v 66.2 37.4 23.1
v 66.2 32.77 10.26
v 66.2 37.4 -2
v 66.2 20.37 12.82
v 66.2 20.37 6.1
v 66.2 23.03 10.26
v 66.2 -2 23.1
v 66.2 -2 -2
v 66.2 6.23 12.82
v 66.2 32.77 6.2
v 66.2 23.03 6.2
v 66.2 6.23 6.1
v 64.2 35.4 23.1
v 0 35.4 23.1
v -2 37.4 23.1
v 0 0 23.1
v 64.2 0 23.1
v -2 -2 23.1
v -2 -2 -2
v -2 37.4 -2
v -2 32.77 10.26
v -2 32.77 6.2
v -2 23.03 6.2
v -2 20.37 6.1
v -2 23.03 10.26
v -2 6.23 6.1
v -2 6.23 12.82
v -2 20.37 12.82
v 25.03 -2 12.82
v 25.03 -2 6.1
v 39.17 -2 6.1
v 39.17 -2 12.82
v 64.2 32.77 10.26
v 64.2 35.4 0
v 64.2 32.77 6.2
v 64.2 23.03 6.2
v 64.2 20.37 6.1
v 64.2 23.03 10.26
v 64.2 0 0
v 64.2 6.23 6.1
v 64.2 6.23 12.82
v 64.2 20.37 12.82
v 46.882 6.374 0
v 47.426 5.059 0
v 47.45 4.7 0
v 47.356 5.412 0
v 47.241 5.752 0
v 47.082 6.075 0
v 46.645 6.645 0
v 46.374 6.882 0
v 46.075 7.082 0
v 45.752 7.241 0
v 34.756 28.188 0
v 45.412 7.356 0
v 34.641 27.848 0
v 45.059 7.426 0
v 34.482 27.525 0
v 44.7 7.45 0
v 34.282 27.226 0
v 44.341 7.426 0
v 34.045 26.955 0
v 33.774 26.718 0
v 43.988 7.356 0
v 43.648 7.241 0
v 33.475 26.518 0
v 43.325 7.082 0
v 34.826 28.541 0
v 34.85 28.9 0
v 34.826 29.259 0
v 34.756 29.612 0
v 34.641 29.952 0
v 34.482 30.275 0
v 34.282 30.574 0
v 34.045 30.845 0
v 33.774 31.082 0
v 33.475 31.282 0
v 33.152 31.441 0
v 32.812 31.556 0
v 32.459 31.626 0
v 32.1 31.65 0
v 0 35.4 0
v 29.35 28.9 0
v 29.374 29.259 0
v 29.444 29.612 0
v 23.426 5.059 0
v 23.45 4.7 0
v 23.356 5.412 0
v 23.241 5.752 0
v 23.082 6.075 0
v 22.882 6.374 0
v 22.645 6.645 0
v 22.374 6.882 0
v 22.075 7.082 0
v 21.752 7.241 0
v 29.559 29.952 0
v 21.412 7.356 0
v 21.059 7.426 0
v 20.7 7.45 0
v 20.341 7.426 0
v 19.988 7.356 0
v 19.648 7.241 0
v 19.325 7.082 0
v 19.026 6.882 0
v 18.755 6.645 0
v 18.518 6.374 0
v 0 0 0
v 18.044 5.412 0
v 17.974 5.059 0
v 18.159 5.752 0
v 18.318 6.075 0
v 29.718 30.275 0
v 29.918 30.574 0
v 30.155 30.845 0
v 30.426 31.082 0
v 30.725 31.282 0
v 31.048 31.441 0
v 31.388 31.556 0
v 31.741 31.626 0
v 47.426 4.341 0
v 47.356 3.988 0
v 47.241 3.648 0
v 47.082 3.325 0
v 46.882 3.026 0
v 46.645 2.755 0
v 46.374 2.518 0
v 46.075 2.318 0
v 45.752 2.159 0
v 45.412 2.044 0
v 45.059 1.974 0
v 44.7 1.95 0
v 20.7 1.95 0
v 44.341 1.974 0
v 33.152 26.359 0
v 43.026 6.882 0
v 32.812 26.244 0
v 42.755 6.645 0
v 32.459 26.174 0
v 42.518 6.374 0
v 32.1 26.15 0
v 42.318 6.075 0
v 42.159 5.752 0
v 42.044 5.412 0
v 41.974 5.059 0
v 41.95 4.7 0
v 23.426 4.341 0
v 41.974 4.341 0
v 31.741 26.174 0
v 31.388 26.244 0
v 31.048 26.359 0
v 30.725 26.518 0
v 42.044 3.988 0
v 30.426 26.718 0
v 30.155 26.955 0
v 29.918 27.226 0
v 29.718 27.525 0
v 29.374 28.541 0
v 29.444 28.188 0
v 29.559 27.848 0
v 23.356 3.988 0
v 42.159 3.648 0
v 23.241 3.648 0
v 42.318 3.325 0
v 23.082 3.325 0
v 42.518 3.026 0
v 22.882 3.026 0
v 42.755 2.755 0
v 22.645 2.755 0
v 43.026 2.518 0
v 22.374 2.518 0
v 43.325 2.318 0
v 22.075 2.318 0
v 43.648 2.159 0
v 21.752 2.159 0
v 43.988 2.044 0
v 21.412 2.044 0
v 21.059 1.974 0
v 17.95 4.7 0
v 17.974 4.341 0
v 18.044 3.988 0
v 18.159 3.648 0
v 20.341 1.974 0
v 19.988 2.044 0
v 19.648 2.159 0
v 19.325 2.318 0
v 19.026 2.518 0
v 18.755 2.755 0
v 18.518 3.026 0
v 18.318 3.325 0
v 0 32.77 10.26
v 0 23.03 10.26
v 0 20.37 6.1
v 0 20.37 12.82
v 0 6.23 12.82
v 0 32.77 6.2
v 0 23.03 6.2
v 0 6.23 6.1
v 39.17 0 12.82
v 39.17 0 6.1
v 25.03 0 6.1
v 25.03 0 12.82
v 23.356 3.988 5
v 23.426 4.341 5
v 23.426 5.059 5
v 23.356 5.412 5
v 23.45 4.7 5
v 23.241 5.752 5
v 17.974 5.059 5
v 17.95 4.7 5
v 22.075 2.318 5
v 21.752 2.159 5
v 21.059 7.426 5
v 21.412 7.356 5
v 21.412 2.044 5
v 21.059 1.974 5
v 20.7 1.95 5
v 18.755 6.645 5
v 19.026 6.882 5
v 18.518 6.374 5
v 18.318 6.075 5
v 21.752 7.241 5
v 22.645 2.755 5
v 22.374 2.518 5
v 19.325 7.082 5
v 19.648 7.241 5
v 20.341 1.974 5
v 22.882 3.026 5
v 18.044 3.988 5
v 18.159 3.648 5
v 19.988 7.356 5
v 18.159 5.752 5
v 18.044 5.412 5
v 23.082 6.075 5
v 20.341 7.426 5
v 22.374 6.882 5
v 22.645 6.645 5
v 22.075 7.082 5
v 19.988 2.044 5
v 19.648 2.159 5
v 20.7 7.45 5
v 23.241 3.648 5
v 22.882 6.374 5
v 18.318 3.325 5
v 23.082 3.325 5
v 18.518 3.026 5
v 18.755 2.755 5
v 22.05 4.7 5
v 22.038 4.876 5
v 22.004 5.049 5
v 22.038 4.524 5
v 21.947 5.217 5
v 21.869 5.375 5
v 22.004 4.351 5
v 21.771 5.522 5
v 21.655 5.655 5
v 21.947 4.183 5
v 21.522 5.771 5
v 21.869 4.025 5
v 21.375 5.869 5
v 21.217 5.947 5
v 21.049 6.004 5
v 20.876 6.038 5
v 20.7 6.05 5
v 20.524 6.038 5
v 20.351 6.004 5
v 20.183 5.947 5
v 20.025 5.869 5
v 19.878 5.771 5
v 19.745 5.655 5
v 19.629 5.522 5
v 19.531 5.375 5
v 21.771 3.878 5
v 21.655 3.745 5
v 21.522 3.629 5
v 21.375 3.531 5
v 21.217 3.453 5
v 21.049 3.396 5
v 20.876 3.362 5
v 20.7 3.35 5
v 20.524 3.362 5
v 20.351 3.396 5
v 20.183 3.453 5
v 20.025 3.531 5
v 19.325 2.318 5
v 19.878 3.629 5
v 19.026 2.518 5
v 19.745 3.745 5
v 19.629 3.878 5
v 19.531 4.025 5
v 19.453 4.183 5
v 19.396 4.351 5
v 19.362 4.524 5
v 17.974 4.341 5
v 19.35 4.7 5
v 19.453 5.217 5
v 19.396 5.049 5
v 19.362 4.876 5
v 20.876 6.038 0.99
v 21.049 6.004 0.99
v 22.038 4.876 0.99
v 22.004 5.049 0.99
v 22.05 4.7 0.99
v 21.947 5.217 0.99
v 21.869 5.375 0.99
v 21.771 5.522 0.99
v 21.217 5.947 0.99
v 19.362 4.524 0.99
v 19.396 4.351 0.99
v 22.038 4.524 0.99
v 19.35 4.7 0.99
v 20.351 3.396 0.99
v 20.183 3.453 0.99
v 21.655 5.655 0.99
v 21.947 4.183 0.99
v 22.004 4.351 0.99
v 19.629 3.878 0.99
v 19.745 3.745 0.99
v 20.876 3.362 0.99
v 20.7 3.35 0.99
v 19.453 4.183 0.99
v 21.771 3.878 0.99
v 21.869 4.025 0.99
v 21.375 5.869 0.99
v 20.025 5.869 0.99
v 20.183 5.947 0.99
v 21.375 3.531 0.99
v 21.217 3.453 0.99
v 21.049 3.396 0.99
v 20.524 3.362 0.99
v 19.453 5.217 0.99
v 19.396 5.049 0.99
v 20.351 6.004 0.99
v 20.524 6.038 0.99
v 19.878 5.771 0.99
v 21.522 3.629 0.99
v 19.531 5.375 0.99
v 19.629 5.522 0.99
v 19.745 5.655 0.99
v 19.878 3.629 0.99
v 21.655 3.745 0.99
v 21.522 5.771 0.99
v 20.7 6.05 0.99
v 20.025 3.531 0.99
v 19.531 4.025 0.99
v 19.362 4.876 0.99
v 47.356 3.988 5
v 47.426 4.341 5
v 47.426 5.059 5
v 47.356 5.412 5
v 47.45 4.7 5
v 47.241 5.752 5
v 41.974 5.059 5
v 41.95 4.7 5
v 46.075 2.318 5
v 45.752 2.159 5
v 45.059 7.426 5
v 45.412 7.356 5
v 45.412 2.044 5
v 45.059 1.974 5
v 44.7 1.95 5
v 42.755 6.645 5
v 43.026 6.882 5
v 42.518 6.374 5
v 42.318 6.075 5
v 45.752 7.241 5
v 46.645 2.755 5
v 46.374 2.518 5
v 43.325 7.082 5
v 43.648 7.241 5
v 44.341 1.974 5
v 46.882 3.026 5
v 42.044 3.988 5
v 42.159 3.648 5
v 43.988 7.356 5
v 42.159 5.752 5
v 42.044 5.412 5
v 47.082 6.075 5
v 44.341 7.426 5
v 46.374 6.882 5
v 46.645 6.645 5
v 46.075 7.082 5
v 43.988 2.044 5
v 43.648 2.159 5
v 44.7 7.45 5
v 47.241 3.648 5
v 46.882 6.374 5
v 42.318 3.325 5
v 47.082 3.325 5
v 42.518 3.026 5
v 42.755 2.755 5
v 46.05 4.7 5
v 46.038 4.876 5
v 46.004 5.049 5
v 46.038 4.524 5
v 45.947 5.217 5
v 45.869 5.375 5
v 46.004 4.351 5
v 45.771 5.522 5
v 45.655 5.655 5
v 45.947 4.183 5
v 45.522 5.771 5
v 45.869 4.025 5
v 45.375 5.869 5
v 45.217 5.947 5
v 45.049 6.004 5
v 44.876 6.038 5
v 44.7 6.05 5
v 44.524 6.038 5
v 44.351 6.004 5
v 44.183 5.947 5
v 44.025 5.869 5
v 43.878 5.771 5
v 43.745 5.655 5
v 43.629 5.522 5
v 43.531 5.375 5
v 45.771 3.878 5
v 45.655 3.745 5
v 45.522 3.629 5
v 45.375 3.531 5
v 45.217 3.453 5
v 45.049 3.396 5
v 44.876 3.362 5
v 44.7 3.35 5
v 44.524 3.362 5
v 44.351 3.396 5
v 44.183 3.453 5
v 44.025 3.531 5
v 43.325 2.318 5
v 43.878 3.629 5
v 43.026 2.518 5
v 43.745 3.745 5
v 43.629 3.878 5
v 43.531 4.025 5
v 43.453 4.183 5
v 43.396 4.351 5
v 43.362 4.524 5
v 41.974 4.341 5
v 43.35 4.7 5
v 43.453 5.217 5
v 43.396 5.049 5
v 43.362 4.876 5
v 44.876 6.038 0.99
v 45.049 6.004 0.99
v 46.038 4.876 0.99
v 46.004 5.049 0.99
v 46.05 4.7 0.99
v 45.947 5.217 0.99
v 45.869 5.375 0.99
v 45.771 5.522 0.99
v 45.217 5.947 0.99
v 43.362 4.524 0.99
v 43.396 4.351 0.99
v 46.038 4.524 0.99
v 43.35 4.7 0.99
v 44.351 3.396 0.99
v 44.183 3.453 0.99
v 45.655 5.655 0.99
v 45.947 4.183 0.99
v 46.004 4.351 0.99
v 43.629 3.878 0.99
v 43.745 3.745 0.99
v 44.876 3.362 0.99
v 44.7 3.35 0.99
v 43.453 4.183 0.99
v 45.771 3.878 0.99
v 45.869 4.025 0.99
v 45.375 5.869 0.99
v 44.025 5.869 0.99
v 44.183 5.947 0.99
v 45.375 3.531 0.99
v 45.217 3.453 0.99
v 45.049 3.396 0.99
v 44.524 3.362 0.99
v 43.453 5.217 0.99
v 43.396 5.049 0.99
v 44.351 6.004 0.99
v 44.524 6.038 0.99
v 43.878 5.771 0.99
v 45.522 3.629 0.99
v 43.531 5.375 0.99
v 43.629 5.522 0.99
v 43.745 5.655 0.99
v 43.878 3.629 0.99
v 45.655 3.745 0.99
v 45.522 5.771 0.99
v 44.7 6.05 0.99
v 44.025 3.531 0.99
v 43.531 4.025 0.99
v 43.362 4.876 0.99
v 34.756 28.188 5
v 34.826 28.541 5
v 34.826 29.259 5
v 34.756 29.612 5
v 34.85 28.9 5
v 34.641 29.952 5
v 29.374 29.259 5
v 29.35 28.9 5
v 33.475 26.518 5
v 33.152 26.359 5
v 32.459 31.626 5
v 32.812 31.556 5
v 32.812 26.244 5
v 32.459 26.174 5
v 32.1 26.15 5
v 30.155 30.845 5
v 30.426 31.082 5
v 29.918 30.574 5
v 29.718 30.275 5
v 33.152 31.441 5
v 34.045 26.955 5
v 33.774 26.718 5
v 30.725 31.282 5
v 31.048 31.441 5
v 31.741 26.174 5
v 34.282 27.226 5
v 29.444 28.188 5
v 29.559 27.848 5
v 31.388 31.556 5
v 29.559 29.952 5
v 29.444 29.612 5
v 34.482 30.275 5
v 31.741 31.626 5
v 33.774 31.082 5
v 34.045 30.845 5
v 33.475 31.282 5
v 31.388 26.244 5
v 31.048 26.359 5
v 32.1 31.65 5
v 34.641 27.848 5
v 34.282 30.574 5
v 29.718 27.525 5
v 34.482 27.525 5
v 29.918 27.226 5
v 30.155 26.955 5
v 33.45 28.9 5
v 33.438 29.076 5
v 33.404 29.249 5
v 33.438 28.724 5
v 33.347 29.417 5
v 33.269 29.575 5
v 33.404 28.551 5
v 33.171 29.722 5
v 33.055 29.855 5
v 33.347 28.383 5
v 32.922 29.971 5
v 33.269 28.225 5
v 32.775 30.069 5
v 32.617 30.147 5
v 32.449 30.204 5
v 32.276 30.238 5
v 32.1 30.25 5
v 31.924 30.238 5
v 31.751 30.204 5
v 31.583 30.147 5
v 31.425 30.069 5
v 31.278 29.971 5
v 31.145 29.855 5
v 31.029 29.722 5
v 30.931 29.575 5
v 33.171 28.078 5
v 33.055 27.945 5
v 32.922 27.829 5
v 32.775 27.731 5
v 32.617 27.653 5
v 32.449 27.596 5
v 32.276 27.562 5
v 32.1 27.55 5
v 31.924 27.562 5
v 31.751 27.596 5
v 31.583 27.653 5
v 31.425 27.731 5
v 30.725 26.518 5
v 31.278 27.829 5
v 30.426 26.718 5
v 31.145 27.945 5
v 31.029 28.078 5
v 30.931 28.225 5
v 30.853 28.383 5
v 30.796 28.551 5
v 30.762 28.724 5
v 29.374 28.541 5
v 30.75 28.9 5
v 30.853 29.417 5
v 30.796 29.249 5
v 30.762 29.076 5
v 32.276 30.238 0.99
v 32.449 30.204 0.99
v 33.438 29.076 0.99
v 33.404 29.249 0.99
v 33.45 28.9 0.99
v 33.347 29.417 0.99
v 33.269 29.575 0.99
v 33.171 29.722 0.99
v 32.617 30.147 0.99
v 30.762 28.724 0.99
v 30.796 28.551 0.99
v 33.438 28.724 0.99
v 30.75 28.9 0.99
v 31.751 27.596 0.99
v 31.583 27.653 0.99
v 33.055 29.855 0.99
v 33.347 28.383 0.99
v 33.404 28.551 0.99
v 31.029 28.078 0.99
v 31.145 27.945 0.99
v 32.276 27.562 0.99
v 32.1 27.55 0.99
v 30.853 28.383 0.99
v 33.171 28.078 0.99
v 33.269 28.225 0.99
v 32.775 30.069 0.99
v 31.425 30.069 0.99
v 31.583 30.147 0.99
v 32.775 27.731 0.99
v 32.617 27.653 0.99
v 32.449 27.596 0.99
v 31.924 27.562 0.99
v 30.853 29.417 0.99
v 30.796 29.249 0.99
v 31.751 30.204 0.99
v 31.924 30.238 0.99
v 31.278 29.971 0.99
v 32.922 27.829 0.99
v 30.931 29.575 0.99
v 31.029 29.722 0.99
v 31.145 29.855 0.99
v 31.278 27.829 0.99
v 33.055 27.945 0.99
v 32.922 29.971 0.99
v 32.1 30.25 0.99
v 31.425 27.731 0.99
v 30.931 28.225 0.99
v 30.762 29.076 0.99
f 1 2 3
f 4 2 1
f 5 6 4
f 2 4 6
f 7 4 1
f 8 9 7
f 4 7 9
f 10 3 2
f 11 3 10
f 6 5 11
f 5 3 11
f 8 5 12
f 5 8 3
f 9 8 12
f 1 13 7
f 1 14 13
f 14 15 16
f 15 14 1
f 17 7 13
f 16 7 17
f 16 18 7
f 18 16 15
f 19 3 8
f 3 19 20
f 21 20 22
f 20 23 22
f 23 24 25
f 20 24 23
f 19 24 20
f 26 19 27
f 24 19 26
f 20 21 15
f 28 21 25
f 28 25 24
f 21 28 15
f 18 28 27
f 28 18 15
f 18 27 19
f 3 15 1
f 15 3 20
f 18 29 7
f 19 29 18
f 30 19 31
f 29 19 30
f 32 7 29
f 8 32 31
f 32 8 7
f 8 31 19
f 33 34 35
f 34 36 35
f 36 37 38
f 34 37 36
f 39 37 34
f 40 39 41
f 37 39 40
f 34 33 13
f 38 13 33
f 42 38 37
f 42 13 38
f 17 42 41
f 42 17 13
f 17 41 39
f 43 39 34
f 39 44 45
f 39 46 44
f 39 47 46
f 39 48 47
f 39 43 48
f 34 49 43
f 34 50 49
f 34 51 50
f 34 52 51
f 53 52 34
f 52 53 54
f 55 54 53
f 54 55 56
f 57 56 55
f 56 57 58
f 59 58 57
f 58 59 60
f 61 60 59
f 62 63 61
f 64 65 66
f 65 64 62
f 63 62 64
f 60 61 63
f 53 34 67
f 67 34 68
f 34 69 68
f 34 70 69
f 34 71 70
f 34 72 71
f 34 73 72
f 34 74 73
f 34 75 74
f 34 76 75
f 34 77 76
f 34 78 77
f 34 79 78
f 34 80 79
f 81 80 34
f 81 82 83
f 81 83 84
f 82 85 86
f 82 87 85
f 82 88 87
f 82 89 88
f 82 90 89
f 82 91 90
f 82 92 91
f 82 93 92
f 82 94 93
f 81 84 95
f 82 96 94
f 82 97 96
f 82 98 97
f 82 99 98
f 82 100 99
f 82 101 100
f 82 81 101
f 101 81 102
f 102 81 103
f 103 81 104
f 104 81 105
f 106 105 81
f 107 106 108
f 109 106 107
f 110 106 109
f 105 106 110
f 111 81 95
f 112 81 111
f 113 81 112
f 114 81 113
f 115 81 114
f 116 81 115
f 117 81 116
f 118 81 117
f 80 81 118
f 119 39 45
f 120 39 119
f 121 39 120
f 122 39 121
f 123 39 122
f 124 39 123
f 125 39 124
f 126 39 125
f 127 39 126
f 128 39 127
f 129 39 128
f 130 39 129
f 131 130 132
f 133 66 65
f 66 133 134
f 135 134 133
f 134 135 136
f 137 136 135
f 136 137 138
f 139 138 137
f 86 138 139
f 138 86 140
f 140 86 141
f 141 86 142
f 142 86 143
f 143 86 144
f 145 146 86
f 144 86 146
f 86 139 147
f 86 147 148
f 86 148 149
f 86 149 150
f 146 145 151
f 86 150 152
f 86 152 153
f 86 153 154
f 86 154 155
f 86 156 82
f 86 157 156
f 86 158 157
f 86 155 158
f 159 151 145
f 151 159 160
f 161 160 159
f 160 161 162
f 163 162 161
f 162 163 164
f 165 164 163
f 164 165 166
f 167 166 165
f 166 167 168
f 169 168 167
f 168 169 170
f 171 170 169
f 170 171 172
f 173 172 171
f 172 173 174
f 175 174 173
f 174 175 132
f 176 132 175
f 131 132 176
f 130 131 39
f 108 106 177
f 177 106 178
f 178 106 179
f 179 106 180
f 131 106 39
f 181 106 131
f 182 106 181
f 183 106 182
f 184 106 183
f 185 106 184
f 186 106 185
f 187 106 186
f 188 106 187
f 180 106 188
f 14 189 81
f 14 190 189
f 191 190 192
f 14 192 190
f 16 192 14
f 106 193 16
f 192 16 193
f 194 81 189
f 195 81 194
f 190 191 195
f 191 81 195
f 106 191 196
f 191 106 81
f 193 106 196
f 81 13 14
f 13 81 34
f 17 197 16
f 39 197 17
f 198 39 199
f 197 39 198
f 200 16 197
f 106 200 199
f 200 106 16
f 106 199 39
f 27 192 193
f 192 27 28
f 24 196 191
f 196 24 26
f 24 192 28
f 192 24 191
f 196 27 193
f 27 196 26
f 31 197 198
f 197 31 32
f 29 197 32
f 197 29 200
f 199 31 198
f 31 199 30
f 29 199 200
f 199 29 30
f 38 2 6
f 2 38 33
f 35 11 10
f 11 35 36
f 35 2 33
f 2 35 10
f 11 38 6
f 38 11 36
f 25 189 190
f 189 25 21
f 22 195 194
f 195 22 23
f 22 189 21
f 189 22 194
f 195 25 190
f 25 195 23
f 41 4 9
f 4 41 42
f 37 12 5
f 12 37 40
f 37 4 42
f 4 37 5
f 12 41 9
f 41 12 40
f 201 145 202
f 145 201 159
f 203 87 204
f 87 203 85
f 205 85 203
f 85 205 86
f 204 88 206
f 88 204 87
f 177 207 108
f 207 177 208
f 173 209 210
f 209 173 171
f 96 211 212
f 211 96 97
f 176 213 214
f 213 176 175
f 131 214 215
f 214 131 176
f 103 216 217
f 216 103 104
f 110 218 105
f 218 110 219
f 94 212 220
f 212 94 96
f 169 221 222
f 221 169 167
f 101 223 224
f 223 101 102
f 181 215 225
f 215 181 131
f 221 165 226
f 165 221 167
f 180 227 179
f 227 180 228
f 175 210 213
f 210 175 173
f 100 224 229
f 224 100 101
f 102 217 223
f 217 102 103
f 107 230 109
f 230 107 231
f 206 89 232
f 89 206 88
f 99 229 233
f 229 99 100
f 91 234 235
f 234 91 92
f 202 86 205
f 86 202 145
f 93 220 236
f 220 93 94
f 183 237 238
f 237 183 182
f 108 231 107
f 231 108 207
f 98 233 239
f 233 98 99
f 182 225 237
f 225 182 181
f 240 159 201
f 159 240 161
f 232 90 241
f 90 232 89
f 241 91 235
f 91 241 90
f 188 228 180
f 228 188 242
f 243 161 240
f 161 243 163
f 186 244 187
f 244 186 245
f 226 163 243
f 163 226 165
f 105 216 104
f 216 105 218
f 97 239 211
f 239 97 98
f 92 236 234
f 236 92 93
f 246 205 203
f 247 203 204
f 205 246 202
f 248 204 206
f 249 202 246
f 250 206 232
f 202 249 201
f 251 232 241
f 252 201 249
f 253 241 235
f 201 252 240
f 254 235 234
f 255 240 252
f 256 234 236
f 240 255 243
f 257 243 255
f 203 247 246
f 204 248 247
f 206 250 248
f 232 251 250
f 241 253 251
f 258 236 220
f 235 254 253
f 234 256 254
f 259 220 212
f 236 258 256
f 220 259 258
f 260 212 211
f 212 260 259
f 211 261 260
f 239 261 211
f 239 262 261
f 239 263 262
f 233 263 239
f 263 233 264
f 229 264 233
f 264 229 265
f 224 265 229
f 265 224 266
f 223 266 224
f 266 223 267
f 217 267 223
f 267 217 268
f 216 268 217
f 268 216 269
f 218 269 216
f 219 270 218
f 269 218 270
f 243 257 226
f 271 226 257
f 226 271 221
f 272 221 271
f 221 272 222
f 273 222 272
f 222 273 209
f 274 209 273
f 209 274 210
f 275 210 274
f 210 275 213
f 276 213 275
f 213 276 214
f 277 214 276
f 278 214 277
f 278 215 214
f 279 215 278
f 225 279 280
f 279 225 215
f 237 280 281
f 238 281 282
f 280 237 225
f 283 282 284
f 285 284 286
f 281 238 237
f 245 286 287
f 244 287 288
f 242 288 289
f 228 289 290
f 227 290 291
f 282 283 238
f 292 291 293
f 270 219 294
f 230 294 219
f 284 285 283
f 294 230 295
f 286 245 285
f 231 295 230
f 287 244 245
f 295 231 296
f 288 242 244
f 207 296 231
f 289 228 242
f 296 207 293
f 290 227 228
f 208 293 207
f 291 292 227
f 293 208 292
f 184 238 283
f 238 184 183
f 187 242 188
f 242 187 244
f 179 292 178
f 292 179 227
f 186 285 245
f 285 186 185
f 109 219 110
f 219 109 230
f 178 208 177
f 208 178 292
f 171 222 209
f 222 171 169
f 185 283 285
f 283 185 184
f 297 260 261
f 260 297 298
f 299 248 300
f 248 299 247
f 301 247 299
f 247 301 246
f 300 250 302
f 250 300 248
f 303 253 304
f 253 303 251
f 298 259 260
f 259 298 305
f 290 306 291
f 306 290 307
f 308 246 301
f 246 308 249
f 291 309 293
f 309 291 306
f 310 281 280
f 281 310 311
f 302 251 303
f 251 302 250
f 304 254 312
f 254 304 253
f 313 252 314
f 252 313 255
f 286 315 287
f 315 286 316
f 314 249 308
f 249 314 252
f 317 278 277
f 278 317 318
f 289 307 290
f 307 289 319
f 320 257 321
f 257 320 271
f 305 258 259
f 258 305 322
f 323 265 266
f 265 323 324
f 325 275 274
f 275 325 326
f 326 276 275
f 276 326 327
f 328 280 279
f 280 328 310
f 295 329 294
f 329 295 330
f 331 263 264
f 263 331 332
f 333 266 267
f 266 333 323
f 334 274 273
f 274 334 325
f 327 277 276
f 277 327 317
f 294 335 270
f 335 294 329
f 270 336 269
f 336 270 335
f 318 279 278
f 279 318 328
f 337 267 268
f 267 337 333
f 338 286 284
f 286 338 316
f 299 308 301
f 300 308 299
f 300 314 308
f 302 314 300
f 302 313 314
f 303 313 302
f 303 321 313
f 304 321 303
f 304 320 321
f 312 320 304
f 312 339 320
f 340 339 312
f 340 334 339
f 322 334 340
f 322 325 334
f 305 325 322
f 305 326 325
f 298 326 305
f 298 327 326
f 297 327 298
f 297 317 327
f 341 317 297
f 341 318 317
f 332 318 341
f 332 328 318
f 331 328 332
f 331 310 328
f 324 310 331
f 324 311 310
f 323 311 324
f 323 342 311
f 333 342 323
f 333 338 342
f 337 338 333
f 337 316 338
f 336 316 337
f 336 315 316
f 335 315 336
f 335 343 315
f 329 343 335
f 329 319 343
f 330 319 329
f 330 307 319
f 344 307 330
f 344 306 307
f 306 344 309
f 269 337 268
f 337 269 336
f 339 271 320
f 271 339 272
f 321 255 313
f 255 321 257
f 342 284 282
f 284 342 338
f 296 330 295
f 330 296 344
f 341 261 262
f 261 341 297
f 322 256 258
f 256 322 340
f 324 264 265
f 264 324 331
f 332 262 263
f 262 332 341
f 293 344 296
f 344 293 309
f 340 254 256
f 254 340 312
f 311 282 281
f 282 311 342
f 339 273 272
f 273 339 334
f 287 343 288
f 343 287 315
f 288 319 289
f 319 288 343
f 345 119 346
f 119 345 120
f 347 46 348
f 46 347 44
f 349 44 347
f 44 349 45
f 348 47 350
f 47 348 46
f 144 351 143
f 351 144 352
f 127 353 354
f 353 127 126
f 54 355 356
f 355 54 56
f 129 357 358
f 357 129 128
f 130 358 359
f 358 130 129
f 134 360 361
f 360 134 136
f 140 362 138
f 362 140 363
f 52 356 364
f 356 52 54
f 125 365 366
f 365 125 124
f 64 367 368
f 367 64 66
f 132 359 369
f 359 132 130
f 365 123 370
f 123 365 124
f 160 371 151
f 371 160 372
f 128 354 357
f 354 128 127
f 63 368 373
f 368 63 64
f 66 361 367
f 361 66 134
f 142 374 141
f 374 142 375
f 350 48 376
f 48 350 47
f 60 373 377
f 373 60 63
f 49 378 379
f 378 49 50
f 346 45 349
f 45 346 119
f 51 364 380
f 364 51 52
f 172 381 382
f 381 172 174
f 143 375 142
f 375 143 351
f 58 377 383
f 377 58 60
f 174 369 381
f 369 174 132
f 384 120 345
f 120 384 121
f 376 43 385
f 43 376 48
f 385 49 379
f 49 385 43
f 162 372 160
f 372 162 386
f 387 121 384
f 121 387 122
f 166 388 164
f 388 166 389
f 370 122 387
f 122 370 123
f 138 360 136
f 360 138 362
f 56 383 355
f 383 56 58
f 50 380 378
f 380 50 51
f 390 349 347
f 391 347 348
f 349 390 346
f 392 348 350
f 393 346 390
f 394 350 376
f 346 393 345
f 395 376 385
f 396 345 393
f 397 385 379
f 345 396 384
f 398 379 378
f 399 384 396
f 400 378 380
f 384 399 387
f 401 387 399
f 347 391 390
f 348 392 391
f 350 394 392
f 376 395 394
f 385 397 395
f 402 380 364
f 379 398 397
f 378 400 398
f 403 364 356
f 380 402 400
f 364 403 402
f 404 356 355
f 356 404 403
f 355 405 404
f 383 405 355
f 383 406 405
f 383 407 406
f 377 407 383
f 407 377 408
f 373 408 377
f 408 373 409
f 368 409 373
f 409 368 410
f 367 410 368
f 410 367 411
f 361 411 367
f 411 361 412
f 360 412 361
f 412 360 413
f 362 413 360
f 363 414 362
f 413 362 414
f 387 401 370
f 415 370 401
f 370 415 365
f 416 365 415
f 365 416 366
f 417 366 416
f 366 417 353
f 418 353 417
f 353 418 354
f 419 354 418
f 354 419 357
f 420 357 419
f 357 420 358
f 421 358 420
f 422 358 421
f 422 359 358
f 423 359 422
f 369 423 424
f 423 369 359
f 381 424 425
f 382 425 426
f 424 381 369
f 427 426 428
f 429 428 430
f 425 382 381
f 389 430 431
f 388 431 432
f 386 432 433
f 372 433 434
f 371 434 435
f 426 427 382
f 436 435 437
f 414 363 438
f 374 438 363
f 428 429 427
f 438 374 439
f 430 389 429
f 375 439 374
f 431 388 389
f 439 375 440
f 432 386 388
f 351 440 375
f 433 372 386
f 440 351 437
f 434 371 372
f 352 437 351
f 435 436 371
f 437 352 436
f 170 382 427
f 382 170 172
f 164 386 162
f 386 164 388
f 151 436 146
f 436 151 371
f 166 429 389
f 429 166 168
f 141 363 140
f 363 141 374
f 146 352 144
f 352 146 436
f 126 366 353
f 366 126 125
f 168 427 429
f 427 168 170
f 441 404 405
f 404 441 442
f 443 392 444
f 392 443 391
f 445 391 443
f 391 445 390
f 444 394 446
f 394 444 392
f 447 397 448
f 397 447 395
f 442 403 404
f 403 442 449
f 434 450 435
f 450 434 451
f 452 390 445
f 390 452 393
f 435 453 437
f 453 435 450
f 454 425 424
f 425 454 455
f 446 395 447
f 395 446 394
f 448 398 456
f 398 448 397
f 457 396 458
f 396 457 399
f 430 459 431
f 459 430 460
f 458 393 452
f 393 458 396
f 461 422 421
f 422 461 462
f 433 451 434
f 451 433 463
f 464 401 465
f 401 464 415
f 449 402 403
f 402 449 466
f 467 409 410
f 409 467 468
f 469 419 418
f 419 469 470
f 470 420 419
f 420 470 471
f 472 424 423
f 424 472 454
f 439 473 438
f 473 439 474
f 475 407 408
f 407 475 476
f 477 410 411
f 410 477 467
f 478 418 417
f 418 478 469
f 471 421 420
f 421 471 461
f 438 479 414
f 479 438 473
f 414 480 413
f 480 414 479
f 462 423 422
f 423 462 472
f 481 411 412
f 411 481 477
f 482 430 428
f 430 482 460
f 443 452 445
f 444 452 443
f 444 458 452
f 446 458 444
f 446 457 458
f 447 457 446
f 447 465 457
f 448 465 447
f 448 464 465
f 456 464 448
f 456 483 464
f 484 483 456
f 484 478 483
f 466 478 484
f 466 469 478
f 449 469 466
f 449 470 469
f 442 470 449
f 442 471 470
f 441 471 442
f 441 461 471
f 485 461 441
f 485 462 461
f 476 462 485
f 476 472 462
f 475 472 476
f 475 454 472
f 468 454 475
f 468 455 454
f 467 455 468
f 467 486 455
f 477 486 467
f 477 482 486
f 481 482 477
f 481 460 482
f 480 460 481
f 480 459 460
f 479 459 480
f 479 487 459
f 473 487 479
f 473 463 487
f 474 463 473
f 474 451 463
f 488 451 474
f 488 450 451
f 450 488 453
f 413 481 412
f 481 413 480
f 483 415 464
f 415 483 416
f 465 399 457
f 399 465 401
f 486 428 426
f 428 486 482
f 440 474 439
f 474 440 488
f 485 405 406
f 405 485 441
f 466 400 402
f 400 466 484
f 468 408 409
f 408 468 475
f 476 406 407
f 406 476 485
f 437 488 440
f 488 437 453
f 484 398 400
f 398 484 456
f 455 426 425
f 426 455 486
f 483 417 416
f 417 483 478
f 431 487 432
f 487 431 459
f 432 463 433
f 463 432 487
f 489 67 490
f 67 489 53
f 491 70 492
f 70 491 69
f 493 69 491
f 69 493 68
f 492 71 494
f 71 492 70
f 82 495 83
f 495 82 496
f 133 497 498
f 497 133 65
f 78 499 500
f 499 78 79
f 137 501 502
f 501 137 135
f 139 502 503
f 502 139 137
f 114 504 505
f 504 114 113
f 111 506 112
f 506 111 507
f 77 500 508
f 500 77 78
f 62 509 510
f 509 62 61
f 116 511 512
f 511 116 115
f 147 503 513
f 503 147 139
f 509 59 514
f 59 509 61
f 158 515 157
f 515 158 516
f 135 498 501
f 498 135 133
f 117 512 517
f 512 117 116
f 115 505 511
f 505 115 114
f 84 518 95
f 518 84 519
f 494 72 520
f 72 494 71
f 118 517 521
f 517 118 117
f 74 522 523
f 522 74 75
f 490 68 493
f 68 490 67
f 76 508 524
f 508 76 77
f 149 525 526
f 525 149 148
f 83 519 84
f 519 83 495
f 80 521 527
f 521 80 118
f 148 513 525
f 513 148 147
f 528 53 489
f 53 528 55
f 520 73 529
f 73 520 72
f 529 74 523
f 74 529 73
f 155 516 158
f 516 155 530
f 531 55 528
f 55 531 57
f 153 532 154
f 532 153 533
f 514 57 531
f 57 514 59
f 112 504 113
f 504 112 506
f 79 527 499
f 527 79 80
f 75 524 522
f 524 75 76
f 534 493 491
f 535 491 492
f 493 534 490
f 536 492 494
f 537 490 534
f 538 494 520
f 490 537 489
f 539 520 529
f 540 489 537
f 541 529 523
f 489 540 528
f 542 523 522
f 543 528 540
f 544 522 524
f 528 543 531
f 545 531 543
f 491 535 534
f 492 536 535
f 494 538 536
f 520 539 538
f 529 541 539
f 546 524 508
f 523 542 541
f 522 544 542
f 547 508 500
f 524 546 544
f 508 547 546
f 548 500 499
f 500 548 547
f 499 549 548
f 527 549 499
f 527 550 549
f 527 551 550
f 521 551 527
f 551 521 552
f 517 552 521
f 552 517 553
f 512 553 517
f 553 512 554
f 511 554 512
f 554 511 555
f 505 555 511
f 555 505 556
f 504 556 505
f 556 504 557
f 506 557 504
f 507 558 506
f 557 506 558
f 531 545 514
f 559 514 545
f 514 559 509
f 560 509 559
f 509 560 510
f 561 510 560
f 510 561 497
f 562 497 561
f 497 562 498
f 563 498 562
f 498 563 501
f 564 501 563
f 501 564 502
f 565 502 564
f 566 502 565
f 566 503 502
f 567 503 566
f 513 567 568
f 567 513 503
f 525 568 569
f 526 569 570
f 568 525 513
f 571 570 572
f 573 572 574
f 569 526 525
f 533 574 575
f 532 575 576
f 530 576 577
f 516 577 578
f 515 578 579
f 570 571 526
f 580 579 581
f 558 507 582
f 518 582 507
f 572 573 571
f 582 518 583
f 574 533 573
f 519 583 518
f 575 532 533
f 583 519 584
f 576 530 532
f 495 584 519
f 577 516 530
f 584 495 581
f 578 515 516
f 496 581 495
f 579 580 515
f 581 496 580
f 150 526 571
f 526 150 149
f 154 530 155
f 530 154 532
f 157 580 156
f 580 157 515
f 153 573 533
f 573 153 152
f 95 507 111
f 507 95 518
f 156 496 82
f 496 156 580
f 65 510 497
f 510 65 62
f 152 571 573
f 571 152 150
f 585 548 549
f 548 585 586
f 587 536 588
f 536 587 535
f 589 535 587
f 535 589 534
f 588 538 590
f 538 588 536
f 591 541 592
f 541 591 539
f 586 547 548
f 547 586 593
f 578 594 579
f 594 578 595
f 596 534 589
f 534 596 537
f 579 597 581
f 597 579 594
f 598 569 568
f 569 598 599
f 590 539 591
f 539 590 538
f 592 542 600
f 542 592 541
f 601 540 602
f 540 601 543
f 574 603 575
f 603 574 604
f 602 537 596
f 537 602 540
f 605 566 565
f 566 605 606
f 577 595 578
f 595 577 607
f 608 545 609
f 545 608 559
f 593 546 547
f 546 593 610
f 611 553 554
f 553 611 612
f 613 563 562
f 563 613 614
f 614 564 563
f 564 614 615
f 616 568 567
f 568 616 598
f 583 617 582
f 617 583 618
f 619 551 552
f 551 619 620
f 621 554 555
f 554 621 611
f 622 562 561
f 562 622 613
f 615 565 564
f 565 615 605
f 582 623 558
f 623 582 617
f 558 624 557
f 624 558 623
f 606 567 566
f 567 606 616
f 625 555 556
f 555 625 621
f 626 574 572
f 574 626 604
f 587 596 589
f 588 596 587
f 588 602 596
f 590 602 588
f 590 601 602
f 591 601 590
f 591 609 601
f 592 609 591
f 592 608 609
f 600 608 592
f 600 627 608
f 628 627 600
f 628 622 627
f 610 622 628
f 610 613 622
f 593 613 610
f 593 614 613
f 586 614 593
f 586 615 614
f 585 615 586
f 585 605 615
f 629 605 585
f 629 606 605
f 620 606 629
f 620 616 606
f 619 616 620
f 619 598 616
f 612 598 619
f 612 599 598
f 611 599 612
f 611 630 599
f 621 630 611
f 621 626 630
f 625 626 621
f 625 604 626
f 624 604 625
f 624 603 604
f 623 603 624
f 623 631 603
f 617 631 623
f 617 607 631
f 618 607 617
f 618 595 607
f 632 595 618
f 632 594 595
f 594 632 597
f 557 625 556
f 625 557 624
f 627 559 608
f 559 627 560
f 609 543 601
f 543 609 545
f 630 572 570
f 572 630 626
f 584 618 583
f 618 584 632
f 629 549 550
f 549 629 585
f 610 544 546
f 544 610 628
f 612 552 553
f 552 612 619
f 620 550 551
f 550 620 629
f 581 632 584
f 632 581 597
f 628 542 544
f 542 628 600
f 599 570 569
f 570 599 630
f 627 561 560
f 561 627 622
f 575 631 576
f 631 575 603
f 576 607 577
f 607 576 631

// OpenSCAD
// REV enclosure -- Taranium-USB-Hub
// Board rev B (61.20 x 32.40 mm). Units: mm.
// Coordinates: origin = inside floor, bottom-left corner of the cavity; x right, y back, z up.
//
// Edit and save -- REV captures every change.
// Each saved change is diffed, turned into engineering actions, verified, and recorded in GBrain.

// === PARAMETERS (edit these) ===
wall = 2.00;              // wall + floor thickness
standoff_h = 5.00;        // PCB sits on top of the standoffs
cavity_w = 64.20;          // inside width  (x)
cavity_d = 35.40;          // inside depth  (y)
cavity_h = 23.10;          // inside height (z, open top)
board_origin_x = 1.50;     // PCB bottom-left corner in the cavity
board_origin_y = 1.50;

// standoff under mounting hole H1
standoff_H1_x = 20.70;
standoff_H1_y = 4.70;
standoff_H1_dia = 5.50;
standoff_H1_bore = 2.70;

// standoff under mounting hole H2
standoff_H2_x = 44.70;
standoff_H2_y = 4.70;
standoff_H2_dia = 5.50;
standoff_H2_bore = 2.70;

// standoff under mounting hole H3
standoff_H3_x = 32.10;
standoff_H3_y = 28.90;
standoff_H3_dia = 5.50;
standoff_H3_bore = 2.70;

// left wall cut-out for J3 usb_a (connector body 13.14 x 5.72); pos = along the wall, z = centre height
opening_J3_usb_a_pos = 13.30;
opening_J3_usb_a_z = 9.46;
opening_J3_usb_a_w = 14.14;
opening_J3_usb_a_h = 6.72;

// front wall cut-out for J1 usb_a (connector body 13.14 x 5.72); pos = along the wall, z = centre height
opening_J1_usb_a_pos = 32.10;
opening_J1_usb_a_z = 9.46;
opening_J1_usb_a_w = 14.14;
opening_J1_usb_a_h = 6.72;

// right wall cut-out for J5 usb_c (connector body 8.94 x 3.26); pos = along the wall, z = centre height
opening_J5_usb_c_pos = 27.90;
opening_J5_usb_c_z = 8.23;
opening_J5_usb_c_w = 9.74;
opening_J5_usb_c_h = 4.06;

// left wall cut-out for J4 usb_c (connector body 8.94 x 3.26); pos = along the wall, z = centre height
opening_J4_usb_c_pos = 27.90;
opening_J4_usb_c_z = 8.23;
opening_J4_usb_c_w = 9.74;
opening_J4_usb_c_h = 4.06;

// right wall cut-out for J2 usb_a (connector body 13.14 x 5.72); pos = along the wall, z = centre height
opening_J2_usb_a_pos = 13.30;
opening_J2_usb_a_z = 9.46;
opening_J2_usb_a_w = 14.14;
opening_J2_usb_a_h = 6.72;
// === END PARAMETERS ===

// --- PCB reference (read-only, from the board design; drawn with % so it is not part of the part) ---
board_w = 61.20;
board_d = 32.40;
board_t = 1.60;
board_max_component_h = 13.50;

$fn = 48;

module cutout(side, pos, z, w, h) {
    if (side == "front") translate([pos - w/2, -wall - 1, z - h/2]) cube([w, wall + 2, h]);
    if (side == "back")  translate([pos - w/2, cavity_d - 1, z - h/2]) cube([w, wall + 2, h]);
    if (side == "left")  translate([-wall - 1, pos - w/2, z - h/2]) cube([wall + 2, w, h]);
    if (side == "right") translate([cavity_w - 1, pos - w/2, z - h/2]) cube([wall + 2, w, h]);
}

module standoff(x, y, dia, bore) {
    translate([x, y, -0.01]) difference() {
        cylinder(h = standoff_h + 0.01, d = dia);
        translate([0, 0, 1]) cylinder(h = standoff_h + 1, d = bore);
    }
}

module shell() {
    difference() {
        translate([-wall, -wall, -wall]) cube([cavity_w + 2*wall, cavity_d + 2*wall, cavity_h + wall]);
        cube([cavity_w, cavity_d, cavity_h + 1]);   // cavity, open top
        cutout("left", opening_J3_usb_a_pos, opening_J3_usb_a_z, opening_J3_usb_a_w, opening_J3_usb_a_h);
        cutout("front", opening_J1_usb_a_pos, opening_J1_usb_a_z, opening_J1_usb_a_w, opening_J1_usb_a_h);
        cutout("right", opening_J5_usb_c_pos, opening_J5_usb_c_z, opening_J5_usb_c_w, opening_J5_usb_c_h);
        cutout("left", opening_J4_usb_c_pos, opening_J4_usb_c_z, opening_J4_usb_c_w, opening_J4_usb_c_h);
        cutout("right", opening_J2_usb_a_pos, opening_J2_usb_a_z, opening_J2_usb_a_w, opening_J2_usb_a_h);
    }
}

module enclosure() {
    union() {
        shell();
        standoff(standoff_H1_x, standoff_H1_y, standoff_H1_dia, standoff_H1_bore);
        standoff(standoff_H2_x, standoff_H2_y, standoff_H2_dia, standoff_H2_bore);
        standoff(standoff_H3_x, standoff_H3_y, standoff_H3_dia, standoff_H3_bore);
    }
}

module pcb() {
    translate([board_origin_x, board_origin_y, standoff_h]) {
        cube([board_w, board_d, board_t]);
        translate([-1, 11.80 - 13.14/2, 1.60]) cube([8, 13.14, 5.72]);   // J3 usb_a
        translate([30.60 - 13.14/2, -1, 1.60]) cube([13.14, 8, 5.72]);   // J1 usb_a
        translate([board_w - 7, 26.40 - 8.94/2, 1.60]) cube([8, 8.94, 3.26]);   // J5 usb_c
        translate([-1, 26.40 - 8.94/2, 1.60]) cube([8, 8.94, 3.26]);   // J4 usb_c
        translate([board_w - 7, 11.80 - 13.14/2, 1.60]) cube([8, 13.14, 5.72]);   // J2 usb_a
    }
}

enclosure();
%pcb();
